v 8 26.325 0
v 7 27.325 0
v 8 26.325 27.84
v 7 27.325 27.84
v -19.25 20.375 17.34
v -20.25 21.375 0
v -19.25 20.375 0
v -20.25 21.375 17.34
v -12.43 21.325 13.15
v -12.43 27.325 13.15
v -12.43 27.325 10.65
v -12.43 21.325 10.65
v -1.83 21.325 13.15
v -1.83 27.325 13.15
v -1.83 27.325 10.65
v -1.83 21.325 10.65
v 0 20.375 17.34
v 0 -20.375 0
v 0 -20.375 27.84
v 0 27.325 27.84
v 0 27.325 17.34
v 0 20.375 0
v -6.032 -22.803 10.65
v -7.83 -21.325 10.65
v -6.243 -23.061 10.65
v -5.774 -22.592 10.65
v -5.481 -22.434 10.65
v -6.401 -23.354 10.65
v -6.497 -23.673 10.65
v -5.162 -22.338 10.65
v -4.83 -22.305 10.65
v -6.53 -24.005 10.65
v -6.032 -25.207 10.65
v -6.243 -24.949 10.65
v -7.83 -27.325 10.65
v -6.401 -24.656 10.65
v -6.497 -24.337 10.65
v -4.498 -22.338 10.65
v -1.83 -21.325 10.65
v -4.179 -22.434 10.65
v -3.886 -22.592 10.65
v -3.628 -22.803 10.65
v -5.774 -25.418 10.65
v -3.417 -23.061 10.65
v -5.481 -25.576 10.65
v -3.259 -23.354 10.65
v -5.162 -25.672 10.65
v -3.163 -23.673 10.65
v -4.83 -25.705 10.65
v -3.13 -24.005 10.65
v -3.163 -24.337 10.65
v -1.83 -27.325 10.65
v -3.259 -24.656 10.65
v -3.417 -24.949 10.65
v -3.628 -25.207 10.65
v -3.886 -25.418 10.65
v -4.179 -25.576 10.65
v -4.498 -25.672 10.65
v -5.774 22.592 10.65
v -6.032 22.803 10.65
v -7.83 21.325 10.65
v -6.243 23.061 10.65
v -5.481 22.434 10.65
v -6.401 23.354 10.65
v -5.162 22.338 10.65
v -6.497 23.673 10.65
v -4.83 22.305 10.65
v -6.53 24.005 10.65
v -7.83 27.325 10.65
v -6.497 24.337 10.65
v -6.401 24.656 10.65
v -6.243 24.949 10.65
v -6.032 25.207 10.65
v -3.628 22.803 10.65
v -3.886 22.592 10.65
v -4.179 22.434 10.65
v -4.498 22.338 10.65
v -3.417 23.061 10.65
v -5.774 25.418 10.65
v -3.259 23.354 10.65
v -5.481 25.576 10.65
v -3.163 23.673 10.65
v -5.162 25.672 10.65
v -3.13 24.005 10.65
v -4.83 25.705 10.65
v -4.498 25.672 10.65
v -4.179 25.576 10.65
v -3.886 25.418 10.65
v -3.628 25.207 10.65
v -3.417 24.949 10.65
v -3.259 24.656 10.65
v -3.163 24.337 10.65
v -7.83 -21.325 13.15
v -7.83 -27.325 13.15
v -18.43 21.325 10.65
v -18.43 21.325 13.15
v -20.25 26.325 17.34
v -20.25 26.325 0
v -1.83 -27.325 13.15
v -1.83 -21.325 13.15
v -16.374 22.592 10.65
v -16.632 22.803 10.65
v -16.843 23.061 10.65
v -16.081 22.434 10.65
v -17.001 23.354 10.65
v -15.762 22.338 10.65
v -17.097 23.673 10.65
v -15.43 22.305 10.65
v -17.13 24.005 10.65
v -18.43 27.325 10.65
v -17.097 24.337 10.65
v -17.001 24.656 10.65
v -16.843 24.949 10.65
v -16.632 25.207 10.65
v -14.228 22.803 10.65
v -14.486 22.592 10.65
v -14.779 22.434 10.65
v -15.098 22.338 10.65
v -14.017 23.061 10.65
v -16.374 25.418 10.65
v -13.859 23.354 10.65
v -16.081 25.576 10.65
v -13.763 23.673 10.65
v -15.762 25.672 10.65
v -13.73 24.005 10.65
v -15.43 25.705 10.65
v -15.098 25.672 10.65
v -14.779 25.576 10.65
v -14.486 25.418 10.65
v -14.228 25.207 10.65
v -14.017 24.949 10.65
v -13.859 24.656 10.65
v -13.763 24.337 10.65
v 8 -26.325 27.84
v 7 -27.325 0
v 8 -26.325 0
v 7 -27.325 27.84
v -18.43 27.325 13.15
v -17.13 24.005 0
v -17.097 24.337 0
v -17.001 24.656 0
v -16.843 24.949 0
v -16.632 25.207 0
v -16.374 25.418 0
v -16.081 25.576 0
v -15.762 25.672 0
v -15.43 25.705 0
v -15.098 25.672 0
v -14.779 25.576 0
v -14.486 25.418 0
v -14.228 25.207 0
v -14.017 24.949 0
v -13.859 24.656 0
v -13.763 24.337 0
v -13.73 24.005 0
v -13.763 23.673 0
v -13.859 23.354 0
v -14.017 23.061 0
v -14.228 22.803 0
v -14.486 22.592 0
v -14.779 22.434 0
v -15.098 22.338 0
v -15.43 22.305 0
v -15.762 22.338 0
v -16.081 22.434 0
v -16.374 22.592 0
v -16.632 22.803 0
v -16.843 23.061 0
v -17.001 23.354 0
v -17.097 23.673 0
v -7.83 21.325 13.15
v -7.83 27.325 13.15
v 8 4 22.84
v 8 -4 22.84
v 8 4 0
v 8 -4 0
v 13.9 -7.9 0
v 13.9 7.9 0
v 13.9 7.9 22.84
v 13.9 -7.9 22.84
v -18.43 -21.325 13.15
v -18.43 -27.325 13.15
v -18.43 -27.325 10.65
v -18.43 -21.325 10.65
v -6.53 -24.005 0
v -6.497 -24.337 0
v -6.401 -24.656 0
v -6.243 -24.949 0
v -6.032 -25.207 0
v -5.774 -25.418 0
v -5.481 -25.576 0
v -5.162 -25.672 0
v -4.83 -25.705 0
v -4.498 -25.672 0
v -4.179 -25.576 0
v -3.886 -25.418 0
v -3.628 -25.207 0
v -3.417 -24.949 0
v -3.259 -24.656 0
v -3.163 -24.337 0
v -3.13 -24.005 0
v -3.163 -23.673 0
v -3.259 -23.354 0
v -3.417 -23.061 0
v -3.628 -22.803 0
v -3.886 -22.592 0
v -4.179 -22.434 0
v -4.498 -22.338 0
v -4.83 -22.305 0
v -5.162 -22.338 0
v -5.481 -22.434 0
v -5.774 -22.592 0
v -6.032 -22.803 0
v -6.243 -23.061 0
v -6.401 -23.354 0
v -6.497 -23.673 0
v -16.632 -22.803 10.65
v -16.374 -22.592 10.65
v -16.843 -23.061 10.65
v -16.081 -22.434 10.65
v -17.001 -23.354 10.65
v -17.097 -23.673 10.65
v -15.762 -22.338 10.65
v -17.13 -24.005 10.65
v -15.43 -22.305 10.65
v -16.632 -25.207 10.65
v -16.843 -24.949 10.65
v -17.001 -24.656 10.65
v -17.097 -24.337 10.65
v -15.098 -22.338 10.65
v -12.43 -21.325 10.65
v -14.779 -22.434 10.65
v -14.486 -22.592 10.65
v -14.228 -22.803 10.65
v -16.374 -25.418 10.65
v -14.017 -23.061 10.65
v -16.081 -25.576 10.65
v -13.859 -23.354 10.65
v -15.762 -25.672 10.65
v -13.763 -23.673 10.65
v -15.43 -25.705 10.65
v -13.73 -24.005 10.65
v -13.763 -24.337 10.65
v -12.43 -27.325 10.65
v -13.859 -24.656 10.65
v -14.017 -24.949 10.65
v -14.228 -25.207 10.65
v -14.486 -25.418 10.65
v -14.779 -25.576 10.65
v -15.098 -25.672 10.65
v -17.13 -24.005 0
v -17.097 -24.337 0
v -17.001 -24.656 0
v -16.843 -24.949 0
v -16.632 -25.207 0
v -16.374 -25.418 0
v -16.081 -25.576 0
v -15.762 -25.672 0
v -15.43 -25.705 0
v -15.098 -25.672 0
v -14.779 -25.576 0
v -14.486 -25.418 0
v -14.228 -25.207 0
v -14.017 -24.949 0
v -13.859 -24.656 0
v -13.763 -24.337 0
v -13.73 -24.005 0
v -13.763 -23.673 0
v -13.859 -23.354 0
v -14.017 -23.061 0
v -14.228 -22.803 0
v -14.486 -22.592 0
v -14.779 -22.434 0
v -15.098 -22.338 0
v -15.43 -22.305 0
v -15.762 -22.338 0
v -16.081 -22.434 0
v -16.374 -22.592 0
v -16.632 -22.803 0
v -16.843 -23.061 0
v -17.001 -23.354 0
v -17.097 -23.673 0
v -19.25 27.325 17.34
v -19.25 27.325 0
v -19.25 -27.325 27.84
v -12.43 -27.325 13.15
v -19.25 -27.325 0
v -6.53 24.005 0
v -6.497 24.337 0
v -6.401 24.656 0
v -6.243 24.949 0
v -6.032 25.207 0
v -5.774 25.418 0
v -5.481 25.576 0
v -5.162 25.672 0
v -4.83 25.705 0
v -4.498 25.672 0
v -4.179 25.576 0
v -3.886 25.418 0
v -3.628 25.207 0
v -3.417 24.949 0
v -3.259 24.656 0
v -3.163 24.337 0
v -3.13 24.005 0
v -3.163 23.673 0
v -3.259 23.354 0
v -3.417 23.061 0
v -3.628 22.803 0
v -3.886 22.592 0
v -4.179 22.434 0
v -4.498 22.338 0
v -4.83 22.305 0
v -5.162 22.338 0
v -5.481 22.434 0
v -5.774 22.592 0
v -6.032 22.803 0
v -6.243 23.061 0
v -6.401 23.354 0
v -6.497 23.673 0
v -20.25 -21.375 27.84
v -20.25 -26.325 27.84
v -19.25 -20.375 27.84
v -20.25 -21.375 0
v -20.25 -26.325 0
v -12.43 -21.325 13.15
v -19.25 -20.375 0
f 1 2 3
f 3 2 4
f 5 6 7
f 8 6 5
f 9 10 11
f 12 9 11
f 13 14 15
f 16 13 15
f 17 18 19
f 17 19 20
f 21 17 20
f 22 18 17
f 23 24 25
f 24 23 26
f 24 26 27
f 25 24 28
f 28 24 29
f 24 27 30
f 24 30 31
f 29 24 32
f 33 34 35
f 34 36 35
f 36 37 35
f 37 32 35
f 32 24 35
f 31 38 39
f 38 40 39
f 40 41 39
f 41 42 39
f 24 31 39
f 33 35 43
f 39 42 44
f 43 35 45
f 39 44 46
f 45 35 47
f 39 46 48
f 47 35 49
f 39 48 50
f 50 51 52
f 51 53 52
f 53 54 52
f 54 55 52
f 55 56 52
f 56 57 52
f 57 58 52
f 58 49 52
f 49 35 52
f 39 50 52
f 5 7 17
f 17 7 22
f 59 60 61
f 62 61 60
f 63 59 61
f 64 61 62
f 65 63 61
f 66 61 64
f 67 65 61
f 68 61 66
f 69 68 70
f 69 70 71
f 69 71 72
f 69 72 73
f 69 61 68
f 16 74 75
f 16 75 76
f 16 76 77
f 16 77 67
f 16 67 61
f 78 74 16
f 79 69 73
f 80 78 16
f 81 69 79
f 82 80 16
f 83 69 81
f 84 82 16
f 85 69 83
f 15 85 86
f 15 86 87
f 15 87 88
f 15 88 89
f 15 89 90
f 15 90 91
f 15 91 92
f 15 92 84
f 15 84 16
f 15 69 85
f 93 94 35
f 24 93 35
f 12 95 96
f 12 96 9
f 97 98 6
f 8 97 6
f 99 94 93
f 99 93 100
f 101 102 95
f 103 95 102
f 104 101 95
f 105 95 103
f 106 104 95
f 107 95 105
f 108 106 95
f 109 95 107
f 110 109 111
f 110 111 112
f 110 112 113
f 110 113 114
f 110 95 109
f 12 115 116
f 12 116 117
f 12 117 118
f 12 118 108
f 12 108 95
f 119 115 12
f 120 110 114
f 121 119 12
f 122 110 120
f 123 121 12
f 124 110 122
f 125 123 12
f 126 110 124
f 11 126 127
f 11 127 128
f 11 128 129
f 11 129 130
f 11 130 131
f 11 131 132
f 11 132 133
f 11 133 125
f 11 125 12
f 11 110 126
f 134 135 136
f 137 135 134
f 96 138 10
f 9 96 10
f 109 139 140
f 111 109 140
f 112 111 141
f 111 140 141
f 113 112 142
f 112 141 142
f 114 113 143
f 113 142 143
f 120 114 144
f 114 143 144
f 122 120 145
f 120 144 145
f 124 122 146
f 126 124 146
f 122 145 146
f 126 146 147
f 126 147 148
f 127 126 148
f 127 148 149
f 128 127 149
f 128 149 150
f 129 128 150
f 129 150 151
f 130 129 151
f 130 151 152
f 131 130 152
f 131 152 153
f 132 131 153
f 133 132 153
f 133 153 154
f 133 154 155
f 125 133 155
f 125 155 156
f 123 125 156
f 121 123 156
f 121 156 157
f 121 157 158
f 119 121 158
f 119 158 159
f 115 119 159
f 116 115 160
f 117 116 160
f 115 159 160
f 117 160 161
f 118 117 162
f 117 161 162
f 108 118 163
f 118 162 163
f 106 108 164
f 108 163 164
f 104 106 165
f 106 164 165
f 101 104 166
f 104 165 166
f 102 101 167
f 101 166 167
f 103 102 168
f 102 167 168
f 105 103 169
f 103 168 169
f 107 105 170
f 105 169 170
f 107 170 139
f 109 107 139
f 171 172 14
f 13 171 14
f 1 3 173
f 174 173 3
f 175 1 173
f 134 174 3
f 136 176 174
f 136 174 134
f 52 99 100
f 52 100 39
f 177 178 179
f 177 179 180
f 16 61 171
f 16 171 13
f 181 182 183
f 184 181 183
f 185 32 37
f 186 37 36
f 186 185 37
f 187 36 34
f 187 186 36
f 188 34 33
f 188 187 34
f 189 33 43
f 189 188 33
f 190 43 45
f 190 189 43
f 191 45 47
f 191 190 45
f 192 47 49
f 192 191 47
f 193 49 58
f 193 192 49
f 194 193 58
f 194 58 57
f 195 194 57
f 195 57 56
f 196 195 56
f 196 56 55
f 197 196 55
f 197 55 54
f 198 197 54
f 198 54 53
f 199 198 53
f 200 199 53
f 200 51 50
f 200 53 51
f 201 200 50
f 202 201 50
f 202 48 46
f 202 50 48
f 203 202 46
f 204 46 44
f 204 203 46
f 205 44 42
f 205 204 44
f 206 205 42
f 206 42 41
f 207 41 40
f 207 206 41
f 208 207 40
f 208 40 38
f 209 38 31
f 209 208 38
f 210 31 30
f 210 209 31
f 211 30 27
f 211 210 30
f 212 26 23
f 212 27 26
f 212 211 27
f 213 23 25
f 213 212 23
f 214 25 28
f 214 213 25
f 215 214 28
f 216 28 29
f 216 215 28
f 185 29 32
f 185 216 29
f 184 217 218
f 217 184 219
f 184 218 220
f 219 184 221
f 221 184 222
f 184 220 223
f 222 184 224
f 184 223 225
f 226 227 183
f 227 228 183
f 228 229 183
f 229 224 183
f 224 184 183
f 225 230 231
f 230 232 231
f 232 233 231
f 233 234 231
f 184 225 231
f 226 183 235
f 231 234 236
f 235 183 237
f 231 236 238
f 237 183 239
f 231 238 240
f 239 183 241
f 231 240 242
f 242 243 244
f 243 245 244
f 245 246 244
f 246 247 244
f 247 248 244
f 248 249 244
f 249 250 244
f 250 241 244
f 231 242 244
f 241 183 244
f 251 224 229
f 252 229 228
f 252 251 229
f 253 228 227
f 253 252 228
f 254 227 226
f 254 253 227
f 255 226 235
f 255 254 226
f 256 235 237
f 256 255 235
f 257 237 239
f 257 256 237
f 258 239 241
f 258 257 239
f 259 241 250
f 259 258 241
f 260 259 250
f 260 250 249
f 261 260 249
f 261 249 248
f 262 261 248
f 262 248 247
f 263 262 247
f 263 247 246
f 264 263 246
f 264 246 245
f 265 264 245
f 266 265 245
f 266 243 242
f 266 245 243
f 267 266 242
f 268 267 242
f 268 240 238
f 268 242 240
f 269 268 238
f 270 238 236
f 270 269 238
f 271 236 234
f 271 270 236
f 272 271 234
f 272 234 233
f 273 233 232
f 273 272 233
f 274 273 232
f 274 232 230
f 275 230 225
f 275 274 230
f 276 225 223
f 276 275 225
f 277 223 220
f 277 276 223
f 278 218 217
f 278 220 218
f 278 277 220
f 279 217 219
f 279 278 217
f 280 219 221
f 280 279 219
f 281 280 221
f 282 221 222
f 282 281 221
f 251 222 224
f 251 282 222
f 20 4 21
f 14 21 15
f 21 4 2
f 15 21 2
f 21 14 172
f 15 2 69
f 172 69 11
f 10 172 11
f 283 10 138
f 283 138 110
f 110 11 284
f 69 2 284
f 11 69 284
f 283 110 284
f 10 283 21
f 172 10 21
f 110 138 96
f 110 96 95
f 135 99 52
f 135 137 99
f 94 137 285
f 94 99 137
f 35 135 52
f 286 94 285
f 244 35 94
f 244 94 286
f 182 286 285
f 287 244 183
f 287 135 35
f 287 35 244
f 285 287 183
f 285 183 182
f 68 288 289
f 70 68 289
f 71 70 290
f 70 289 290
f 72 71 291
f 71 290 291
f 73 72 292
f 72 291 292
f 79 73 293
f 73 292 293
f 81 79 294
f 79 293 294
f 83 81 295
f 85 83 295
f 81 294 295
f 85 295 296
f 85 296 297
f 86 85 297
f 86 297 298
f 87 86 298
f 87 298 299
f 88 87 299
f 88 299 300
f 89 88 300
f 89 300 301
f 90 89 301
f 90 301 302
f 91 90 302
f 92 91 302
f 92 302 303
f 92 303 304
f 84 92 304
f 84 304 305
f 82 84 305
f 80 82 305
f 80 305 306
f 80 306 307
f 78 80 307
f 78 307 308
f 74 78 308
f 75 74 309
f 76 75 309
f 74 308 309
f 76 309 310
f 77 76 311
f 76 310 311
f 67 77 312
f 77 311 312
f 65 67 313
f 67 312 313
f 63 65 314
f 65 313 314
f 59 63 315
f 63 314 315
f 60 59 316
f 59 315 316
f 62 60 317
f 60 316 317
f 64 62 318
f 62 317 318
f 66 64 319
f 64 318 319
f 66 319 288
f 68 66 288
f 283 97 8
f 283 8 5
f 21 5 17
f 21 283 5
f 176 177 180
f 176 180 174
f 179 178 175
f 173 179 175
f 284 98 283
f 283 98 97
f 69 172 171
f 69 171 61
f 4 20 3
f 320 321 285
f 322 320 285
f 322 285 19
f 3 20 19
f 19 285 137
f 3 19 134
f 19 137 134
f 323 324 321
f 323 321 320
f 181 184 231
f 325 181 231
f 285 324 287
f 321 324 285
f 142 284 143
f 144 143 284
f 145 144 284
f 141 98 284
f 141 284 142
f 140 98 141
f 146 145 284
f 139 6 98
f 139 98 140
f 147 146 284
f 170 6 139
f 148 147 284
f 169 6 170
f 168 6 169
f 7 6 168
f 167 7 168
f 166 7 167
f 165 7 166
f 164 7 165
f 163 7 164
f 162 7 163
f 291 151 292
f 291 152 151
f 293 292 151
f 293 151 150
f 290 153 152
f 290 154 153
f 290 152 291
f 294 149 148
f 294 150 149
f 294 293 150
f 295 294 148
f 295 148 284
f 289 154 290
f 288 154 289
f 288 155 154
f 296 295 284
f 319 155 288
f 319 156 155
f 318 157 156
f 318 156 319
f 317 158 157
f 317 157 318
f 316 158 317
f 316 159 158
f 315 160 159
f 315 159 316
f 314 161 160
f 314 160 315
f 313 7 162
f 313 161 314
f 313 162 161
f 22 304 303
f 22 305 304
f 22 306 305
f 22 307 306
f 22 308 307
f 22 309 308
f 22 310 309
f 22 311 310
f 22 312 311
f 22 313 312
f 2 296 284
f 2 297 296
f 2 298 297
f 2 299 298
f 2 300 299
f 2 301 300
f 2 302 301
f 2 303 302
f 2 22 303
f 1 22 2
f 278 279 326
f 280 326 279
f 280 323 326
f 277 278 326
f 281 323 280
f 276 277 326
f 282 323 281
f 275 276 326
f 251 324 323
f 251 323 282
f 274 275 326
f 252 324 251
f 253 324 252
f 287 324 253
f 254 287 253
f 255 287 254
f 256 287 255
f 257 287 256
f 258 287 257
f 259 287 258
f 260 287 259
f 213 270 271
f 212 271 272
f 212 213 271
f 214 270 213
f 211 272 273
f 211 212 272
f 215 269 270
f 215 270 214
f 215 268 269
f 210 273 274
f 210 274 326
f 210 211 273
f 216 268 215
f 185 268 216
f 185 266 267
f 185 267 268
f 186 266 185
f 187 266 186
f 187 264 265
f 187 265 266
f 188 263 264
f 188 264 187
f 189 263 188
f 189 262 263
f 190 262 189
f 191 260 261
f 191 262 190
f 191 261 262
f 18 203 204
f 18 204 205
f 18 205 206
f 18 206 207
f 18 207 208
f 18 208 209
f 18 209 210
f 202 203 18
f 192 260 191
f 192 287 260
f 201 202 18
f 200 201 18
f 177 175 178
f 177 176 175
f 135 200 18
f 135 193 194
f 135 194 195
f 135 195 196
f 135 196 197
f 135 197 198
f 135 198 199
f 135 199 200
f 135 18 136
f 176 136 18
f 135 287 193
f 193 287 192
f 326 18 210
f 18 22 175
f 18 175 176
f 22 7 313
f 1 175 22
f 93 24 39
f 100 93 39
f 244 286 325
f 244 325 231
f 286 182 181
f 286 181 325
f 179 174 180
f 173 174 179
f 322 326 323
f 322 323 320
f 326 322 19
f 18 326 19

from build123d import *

# Parameters (mm, degrees)
BOSS_EXTRUDE1_DEPTH      = 27.84
SKETCH6_R                = 1.7
CUT_EXTRUDE1_DEPTH       = 13.15
SKETCH7_W                = 6
SKETCH7_H                = 2.5
CUT_EXTRUDE2_DEPTH       = 6
CHAMFER1_SIZE            = 1
CHAMFER1_OF_MIRROR2_SIZE = 1
SKETCH8_W                = 5
SKETCH8_H                = 15.8
CUT_EXTRUDE3_DEPTH       = 6.9
CUT_EXTRUDE4_REACH       = 56.65
SKETCH9_W                = 20.25
SKETCH9_H                = 10.5


with BuildPart() as part:
    # Sketch5 → Boss-Extrude1 (new body)
    with BuildSketch(Plane.XY):
        Polygon((8, 4), (8, 0), (13.9, 0), (13.9, 7.9), align=None)
        Polygon((-20.25, 27.325), (-20.25, 20.375), (0, 20.375), (0, 0), (8, 0), (8, 27.325), align=None)
    boss_extrude1 = extrude(amount=BOSS_EXTRUDE1_DEPTH)

    # Sketch6 → Cut-Extrude1 (cut)
    with BuildSketch(Plane(origin=(0, 0, 0), x_dir=(-1, 0, 0), z_dir=(0, 0, -1))):
        with Locations((4.83, 24.005)):
            Circle(SKETCH6_R)
        with Locations((15.43, 24.005)):
            Circle(SKETCH6_R)
    cut_extrude1 = extrude(amount=-CUT_EXTRUDE1_DEPTH, mode=Mode.SUBTRACT)

    # Sketch7 → Cut-Extrude2 (cut)
    with BuildSketch(Plane(origin=(0, 27.325, 0), x_dir=(1, 0, 0), z_dir=(0, 1, 0))):
        with Locations((-4.83, -11.9)):
            Rectangle(SKETCH7_W, SKETCH7_H)
        with Locations((-15.43, -11.9)):
            Rectangle(SKETCH7_W, SKETCH7_H)
    cut_extrude2 = extrude(amount=-CUT_EXTRUDE2_DEPTH, mode=Mode.SUBTRACT)

    # Chamfer1
    chamfer1_edges = [part.edges().sort_by_distance(p)[0] for p in [
        (-20.25, 20.375, 13.92),
        (-20.25, 27.325, 13.92),
        (8, 27.325, 13.92),
    ]]
    chamfer(chamfer1_edges, length=CHAMFER1_SIZE)

    # Mirror2: Boss-Extrude1, Cut-Extrude1, Cut-Extrude2 across plane
    add(boss_extrude1.mirror(Plane(origin=(0, 0, 27.84), x_dir=(0, 0, 1), z_dir=(0, -1, 0))))
    add(cut_extrude1.mirror(Plane(origin=(0, 0, 27.84), x_dir=(0, 0, 1), z_dir=(0, -1, 0))), mode=Mode.SUBTRACT)
    add(cut_extrude2.mirror(Plane(origin=(0, 0, 27.84), x_dir=(0, 0, 1), z_dir=(0, -1, 0))), mode=Mode.SUBTRACT)

    # Chamfer1 of Mirror2
    chamfer1_of_mirror2_edges = [part.edges().sort_by_distance(p)[0] for p in [
        (-20.25, -20.375, 13.92),
        (-20.25, -27.325, 13.92),
        (8, -27.325, 13.92),
    ]]
    chamfer(chamfer1_of_mirror2_edges, length=CHAMFER1_OF_MIRROR2_SIZE)

    # Sketch8 → Cut-Extrude3 (cut, through all)
    with BuildSketch(Plane(origin=(8, 0, 0), x_dir=(0, 0, -1), z_dir=(1, 0, 0))):
        with Locations((-25.34, 0)):
            Rectangle(SKETCH8_W, SKETCH8_H)
    extrude(amount=CUT_EXTRUDE3_DEPTH, mode=Mode.SUBTRACT)

    # Sketch9 → Cut-Extrude4 (cut, up to next)
    with BuildSketch(Plane(origin=(0, 27.325, 0), x_dir=(1, 0, 0), z_dir=(0, 1, 0)), mode=Mode.PRIVATE) as cut_extrude4_sk1:
        with Locations((-10.125, -22.59)):
            Rectangle(SKETCH9_W, SKETCH9_H)
    cut_extrude4_tool1 = extrude(cut_extrude4_sk1.sketch, amount=-CUT_EXTRUDE4_REACH, mode=Mode.PRIVATE) & part.part
    add(cut_extrude4_tool1.solids().sort_by_distance((-10.125, 27.325, 22.59))[0], mode=Mode.SUBTRACT)


solid = part.part
